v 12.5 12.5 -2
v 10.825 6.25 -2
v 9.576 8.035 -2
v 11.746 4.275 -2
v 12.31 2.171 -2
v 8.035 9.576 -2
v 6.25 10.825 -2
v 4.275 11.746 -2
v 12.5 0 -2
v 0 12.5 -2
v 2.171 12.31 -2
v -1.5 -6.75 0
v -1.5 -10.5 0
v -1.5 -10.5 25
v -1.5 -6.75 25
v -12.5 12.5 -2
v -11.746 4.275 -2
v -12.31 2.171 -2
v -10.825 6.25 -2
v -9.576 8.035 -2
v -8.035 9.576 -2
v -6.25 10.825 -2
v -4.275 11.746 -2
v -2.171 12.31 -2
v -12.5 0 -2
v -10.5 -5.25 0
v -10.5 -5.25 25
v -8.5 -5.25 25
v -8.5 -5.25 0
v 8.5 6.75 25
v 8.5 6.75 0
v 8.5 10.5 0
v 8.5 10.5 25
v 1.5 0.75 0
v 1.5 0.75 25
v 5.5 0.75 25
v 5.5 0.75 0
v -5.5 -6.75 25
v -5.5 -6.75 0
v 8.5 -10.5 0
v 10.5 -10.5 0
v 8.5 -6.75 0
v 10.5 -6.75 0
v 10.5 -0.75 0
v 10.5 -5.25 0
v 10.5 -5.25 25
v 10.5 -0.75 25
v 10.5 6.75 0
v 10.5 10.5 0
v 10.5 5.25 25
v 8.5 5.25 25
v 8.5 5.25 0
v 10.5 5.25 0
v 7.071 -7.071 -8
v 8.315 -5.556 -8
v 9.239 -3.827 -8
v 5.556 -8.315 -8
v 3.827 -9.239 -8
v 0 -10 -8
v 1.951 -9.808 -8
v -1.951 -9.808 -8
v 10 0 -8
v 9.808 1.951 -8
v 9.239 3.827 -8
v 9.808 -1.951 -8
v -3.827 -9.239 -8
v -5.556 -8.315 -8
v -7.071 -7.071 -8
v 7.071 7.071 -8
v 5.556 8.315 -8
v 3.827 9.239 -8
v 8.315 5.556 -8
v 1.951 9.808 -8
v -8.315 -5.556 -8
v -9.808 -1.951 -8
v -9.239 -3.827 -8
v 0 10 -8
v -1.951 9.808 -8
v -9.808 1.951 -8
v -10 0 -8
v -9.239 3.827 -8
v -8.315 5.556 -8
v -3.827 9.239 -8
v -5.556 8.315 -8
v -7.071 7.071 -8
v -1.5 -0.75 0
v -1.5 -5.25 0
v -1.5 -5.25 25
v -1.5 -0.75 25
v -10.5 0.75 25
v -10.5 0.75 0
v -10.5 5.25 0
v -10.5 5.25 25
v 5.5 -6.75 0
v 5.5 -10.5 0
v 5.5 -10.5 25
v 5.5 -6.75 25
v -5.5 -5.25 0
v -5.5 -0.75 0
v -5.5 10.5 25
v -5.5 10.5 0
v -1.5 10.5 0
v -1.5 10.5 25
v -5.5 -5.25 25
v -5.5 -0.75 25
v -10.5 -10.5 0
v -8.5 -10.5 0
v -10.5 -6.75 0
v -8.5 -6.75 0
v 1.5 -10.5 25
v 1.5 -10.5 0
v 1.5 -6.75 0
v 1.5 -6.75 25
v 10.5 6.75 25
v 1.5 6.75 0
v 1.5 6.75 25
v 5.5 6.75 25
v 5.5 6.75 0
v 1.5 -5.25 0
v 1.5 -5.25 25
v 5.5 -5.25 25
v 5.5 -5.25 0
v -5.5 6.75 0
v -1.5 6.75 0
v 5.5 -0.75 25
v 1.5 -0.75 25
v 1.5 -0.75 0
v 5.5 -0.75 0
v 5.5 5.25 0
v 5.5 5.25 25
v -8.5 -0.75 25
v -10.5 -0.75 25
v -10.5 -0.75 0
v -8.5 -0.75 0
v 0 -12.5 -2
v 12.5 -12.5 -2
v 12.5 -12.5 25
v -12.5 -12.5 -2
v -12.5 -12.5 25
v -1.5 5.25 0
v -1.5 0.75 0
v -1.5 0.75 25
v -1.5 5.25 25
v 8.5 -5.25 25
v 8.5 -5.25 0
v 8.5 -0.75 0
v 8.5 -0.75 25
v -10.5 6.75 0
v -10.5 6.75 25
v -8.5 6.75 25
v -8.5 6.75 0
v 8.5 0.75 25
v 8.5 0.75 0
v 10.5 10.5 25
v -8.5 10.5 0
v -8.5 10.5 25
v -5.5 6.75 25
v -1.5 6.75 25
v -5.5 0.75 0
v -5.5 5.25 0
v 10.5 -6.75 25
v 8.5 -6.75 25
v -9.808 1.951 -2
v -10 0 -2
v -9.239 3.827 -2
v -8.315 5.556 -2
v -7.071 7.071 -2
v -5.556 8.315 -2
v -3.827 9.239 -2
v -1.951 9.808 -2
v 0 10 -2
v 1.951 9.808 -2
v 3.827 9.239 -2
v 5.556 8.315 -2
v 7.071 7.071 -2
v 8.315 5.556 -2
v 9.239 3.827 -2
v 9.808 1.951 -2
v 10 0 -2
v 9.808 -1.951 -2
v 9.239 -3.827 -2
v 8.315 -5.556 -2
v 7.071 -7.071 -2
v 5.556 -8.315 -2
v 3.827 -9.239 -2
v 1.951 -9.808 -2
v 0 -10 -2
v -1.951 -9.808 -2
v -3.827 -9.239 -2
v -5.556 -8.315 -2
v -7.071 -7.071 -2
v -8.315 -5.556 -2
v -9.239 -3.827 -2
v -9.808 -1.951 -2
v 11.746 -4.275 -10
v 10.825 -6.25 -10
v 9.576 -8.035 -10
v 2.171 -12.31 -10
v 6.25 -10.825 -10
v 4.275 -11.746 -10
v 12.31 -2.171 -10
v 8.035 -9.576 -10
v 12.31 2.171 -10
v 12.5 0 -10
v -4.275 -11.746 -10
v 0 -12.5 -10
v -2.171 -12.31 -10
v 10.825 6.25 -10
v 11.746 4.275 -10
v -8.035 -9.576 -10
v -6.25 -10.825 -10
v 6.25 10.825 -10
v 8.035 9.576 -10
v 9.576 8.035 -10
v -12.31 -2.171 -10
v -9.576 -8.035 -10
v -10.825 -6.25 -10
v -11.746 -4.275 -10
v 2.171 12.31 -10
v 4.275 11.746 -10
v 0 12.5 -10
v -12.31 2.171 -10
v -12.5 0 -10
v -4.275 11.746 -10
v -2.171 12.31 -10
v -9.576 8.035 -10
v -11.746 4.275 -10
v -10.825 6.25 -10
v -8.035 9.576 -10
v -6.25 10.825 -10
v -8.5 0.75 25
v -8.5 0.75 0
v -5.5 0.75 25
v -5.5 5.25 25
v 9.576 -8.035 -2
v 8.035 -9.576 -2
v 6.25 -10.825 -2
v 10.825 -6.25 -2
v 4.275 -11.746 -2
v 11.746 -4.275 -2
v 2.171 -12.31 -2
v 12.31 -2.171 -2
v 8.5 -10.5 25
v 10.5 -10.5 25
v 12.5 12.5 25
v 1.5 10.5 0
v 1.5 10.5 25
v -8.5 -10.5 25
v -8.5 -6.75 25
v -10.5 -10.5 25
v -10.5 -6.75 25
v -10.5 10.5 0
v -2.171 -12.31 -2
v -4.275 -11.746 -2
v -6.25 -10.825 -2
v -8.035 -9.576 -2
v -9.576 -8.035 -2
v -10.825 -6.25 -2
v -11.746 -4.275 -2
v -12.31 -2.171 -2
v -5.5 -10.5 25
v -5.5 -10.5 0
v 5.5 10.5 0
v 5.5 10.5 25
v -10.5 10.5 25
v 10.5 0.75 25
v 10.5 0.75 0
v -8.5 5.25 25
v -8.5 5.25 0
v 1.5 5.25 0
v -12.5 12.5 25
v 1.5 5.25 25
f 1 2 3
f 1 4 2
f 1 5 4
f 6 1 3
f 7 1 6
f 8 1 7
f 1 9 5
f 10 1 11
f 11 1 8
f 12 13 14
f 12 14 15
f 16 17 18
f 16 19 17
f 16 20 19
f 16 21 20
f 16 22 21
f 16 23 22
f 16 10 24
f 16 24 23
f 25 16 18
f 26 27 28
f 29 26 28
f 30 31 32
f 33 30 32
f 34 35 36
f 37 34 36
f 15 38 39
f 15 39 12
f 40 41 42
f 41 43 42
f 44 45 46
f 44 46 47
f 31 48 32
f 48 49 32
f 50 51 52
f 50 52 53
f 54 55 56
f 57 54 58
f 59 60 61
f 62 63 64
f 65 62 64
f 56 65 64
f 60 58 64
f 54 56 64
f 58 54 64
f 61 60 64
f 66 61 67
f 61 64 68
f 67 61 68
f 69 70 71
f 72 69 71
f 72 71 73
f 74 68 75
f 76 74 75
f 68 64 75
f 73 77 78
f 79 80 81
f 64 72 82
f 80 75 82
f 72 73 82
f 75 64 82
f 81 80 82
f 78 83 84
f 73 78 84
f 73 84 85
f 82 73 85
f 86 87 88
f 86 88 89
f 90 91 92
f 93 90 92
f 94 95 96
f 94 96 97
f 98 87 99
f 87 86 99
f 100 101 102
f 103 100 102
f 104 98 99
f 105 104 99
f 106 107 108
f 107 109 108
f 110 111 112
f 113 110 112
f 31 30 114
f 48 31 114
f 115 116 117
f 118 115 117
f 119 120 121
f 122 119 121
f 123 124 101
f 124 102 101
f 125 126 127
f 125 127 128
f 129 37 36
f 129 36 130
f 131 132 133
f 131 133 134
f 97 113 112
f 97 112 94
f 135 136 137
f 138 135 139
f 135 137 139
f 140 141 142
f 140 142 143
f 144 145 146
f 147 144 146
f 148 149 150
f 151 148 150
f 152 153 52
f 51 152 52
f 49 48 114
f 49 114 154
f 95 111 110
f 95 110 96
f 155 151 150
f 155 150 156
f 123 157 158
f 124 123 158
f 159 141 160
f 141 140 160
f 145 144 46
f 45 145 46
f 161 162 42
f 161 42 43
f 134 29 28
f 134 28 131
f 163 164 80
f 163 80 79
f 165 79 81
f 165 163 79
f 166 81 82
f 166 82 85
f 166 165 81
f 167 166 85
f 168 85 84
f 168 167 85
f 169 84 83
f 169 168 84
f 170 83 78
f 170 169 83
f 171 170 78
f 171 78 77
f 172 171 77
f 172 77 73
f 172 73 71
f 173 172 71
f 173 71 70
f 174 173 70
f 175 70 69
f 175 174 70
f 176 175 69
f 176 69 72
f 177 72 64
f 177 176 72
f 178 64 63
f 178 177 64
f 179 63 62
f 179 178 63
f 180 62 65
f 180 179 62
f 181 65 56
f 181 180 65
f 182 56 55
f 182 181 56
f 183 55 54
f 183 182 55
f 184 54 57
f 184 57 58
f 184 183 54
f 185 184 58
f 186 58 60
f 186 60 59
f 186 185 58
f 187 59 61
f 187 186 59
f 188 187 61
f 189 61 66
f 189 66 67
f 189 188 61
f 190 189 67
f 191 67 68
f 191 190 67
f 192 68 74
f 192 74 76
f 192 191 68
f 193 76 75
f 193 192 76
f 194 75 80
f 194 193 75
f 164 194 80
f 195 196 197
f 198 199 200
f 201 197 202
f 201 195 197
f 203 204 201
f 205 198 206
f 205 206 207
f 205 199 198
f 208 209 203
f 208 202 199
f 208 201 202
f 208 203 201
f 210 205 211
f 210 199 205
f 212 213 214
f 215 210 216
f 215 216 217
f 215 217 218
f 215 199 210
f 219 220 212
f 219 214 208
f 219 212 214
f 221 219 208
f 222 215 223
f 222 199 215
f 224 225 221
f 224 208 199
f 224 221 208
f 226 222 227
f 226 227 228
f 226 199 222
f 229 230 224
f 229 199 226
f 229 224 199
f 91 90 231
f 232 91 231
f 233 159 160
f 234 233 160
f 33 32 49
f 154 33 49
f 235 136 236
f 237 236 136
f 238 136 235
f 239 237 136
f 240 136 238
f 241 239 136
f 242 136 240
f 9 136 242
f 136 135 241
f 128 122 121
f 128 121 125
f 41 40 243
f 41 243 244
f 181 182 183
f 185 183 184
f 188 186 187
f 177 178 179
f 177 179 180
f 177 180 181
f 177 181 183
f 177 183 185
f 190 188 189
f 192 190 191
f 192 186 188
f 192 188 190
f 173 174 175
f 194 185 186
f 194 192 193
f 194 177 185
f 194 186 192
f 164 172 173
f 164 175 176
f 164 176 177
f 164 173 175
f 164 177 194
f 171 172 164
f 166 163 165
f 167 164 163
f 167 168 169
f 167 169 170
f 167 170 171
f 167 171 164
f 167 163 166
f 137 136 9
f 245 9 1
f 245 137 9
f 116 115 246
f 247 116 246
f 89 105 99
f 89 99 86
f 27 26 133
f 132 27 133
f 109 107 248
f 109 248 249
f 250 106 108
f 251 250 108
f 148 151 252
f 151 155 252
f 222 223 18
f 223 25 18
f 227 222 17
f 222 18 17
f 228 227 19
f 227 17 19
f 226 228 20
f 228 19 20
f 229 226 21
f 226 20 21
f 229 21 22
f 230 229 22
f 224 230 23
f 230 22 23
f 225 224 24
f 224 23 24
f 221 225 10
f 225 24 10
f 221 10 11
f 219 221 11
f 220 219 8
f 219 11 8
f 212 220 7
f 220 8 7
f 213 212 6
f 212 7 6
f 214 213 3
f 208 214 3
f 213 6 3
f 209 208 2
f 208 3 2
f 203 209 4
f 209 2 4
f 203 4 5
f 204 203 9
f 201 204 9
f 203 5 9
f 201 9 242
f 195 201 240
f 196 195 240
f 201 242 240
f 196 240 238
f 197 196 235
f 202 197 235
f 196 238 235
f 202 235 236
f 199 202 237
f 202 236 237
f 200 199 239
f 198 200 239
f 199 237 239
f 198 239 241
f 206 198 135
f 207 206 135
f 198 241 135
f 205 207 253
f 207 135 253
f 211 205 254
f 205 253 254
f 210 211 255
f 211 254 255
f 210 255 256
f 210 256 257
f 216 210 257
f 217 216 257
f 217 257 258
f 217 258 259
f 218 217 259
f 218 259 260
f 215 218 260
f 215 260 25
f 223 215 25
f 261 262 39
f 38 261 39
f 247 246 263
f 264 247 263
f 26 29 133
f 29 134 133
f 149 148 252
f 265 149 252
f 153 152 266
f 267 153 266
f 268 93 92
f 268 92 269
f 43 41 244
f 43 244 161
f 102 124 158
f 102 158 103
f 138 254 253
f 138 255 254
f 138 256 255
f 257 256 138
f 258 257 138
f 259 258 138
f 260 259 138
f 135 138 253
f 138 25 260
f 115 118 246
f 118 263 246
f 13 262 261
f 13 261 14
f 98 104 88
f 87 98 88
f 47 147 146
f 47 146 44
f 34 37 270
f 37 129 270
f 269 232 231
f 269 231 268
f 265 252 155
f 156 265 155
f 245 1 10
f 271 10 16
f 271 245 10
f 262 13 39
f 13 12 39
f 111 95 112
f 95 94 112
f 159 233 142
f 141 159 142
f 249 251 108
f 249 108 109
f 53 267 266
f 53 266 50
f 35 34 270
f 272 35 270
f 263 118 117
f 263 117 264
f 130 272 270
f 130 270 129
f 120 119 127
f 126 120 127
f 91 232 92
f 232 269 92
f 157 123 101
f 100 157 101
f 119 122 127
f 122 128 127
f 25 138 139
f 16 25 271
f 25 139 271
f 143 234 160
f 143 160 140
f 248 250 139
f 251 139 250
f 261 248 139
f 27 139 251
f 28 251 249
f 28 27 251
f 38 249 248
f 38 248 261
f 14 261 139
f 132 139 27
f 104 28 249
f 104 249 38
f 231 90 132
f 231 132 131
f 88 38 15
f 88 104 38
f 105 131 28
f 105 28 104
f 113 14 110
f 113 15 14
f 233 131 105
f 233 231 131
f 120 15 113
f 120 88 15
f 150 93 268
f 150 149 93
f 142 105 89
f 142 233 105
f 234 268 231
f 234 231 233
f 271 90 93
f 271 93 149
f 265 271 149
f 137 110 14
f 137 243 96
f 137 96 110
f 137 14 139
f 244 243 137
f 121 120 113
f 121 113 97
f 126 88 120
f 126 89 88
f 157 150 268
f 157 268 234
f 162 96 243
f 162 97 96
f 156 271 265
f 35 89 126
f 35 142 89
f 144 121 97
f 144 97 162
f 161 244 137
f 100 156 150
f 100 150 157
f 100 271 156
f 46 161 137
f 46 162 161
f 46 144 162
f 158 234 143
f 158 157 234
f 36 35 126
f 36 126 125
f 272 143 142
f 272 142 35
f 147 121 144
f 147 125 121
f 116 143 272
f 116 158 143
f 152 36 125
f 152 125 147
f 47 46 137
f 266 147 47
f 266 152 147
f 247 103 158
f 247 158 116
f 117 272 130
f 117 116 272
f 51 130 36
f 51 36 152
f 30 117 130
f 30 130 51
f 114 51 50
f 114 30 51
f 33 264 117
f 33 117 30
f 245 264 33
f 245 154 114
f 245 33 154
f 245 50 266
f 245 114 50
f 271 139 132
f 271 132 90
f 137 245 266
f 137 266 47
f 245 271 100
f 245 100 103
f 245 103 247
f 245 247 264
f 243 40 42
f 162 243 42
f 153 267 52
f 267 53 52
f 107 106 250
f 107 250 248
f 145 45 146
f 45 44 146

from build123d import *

# Parameters (mm, degrees)
SKETCH_8_W       = 25
SKETCH_8_H       = 25
SKETCH_8_W_2     = 4
SKETCH_8_H_2     = 21
SKETCH_8_W_3     = 2
EXTRUDE_7_DEPTH  = 25
SKETCH_9_W       = 25
SKETCH_9_H       = 25
EXTRUDE_8_DEPTH  = 2
SKETCH_14_W      = 25
SKETCH_14_H      = 1.5
EXTRUDE_11_DEPTH = 25
SKETCH_16_R      = 12.5
SKETCH_16_R_2    = 10
EXTRUDE_14_DEPTH = 6
SKETCH_17_R      = 12.5
EXTRUDE_15_DEPTH = 2


with BuildPart() as part:
    # 草图8 → 凸台-拉伸7 (new body)
    with BuildSketch(Plane.XY):
        Rectangle(SKETCH_8_W, SKETCH_8_H)
        with Locations((3.5, 0)):
            Rectangle(SKETCH_8_W_2, SKETCH_8_H_2, mode=Mode.SUBTRACT)
        with Locations((-3.5, 0)):
            Rectangle(SKETCH_8_W_2, SKETCH_8_H_2, mode=Mode.SUBTRACT)
        with Locations((-9.5, 0)):
            Rectangle(SKETCH_8_W_3, SKETCH_8_H_2, mode=Mode.SUBTRACT)
        with Locations((9.5, 0)):
            Rectangle(SKETCH_8_W_3, SKETCH_8_H_2, mode=Mode.SUBTRACT)
    extrude(amount=EXTRUDE_7_DEPTH)

    # 草图9 → 凸台-拉伸8 (add)
    with BuildSketch(Plane(origin=(0, 0, 0), x_dir=(-1, 0, 0), z_dir=(0, 0, -1))):
        Rectangle(SKETCH_9_W, SKETCH_9_H)
    extrude(amount=EXTRUDE_8_DEPTH)

    # 草图14 → 凸台-拉伸11 (add)
    with BuildSketch(Plane.XY.offset(25)):
        Rectangle(SKETCH_14_W, SKETCH_14_H)
        with Locations((0, 6)):
            Rectangle(SKETCH_14_W, SKETCH_14_H)
        with Locations((0, -6)):
            Rectangle(SKETCH_14_W, SKETCH_14_H)
    extrude(amount=-EXTRUDE_11_DEPTH)

    # 草图16 → 凸台-拉伸14 (add)
    with BuildSketch(Plane(origin=(0, 0, -2), x_dir=(-1, 0, 0), z_dir=(0, 0, -1))):
        Circle(SKETCH_16_R)
        Circle(SKETCH_16_R_2, mode=Mode.SUBTRACT)
    extrude(amount=EXTRUDE_14_DEPTH)

    # 草图17 → 凸台-拉伸15 (add)
    with BuildSketch(Plane(origin=(0, 0, -8), x_dir=(-1, 0, 0), z_dir=(0, 0, -1))):
        Circle(SKETCH_17_R)
    extrude(amount=EXTRUDE_15_DEPTH)


solid = part.part
